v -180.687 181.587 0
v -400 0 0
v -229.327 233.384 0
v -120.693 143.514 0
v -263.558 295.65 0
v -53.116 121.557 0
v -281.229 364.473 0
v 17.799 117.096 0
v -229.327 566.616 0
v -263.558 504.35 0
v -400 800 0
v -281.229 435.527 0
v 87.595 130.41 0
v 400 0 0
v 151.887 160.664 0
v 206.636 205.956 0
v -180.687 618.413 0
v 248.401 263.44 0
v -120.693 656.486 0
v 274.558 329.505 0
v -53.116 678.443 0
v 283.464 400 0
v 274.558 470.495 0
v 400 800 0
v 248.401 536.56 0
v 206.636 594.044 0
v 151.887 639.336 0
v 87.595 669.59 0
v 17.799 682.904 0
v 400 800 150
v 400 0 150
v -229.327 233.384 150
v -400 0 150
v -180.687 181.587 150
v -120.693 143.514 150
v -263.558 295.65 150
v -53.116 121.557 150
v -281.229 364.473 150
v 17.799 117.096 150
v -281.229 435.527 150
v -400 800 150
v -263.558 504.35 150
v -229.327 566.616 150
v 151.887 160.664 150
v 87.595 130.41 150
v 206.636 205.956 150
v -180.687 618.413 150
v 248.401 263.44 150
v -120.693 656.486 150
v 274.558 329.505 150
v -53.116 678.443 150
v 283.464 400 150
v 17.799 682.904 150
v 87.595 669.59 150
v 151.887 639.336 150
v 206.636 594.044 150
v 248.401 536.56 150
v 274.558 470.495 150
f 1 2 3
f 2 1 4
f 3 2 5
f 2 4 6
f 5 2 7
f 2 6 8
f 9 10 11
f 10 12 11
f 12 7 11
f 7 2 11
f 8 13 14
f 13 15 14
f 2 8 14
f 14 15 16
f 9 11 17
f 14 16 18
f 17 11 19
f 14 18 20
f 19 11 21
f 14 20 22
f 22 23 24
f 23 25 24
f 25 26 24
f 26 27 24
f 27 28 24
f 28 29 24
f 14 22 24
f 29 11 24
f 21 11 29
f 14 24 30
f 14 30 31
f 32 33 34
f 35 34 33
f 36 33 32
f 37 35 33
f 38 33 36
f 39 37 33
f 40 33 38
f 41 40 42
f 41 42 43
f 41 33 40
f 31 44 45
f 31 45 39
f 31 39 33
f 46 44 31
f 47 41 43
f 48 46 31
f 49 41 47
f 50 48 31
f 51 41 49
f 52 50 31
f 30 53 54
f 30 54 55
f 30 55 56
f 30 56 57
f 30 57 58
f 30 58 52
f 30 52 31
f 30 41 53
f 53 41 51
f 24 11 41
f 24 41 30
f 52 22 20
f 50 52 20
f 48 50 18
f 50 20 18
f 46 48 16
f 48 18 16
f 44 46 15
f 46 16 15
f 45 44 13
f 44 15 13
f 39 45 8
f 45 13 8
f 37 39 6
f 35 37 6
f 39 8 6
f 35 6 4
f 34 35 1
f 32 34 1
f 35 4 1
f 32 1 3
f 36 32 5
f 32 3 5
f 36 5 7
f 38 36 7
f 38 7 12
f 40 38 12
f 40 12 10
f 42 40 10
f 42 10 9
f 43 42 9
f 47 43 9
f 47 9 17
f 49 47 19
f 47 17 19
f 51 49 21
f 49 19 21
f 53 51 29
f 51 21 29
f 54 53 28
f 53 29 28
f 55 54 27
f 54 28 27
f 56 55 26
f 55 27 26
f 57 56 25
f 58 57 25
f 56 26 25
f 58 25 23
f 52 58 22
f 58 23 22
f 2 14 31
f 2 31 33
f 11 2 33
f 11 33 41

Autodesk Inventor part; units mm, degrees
ref_plane "YZ Plane" through (0, 0, 0) normal (1, 0, 0) x (0, 1, 0)
ref_plane "XZ Plane" through (0, 0, 0) normal (0, 1, 0) x (-1, 0, 0)
ref_plane "XY Plane" through (0, 0, 0) normal (0, 0, 1) x (1, 0, 0)
sketch "Boceto1" plane through (0, 0, 0) normal (0, 0, 1) x (1, 0, 0)
  line L0 (-400, 800) -> (400, 800)
  line L1 (400, 800) -> (400, 0)
  line L2 (400, 0) -> (-400, 0)
  line L3 (-400, 0) -> (-400, 800)
  circle A0 centre (0, 400) radius 283.4638
  line L4 (-400, 400) -> (400, 400)
  point P0 (0, 0)
  point P1 (0, 0)
  dimension "d0" = 800
extrude "Extrusión1" add sketch "Boceto1" along normal blind 150 contours L0 L1 L4 A0 L3 | L4 A0 L1 L2 L3
properties part number "Bobina"
